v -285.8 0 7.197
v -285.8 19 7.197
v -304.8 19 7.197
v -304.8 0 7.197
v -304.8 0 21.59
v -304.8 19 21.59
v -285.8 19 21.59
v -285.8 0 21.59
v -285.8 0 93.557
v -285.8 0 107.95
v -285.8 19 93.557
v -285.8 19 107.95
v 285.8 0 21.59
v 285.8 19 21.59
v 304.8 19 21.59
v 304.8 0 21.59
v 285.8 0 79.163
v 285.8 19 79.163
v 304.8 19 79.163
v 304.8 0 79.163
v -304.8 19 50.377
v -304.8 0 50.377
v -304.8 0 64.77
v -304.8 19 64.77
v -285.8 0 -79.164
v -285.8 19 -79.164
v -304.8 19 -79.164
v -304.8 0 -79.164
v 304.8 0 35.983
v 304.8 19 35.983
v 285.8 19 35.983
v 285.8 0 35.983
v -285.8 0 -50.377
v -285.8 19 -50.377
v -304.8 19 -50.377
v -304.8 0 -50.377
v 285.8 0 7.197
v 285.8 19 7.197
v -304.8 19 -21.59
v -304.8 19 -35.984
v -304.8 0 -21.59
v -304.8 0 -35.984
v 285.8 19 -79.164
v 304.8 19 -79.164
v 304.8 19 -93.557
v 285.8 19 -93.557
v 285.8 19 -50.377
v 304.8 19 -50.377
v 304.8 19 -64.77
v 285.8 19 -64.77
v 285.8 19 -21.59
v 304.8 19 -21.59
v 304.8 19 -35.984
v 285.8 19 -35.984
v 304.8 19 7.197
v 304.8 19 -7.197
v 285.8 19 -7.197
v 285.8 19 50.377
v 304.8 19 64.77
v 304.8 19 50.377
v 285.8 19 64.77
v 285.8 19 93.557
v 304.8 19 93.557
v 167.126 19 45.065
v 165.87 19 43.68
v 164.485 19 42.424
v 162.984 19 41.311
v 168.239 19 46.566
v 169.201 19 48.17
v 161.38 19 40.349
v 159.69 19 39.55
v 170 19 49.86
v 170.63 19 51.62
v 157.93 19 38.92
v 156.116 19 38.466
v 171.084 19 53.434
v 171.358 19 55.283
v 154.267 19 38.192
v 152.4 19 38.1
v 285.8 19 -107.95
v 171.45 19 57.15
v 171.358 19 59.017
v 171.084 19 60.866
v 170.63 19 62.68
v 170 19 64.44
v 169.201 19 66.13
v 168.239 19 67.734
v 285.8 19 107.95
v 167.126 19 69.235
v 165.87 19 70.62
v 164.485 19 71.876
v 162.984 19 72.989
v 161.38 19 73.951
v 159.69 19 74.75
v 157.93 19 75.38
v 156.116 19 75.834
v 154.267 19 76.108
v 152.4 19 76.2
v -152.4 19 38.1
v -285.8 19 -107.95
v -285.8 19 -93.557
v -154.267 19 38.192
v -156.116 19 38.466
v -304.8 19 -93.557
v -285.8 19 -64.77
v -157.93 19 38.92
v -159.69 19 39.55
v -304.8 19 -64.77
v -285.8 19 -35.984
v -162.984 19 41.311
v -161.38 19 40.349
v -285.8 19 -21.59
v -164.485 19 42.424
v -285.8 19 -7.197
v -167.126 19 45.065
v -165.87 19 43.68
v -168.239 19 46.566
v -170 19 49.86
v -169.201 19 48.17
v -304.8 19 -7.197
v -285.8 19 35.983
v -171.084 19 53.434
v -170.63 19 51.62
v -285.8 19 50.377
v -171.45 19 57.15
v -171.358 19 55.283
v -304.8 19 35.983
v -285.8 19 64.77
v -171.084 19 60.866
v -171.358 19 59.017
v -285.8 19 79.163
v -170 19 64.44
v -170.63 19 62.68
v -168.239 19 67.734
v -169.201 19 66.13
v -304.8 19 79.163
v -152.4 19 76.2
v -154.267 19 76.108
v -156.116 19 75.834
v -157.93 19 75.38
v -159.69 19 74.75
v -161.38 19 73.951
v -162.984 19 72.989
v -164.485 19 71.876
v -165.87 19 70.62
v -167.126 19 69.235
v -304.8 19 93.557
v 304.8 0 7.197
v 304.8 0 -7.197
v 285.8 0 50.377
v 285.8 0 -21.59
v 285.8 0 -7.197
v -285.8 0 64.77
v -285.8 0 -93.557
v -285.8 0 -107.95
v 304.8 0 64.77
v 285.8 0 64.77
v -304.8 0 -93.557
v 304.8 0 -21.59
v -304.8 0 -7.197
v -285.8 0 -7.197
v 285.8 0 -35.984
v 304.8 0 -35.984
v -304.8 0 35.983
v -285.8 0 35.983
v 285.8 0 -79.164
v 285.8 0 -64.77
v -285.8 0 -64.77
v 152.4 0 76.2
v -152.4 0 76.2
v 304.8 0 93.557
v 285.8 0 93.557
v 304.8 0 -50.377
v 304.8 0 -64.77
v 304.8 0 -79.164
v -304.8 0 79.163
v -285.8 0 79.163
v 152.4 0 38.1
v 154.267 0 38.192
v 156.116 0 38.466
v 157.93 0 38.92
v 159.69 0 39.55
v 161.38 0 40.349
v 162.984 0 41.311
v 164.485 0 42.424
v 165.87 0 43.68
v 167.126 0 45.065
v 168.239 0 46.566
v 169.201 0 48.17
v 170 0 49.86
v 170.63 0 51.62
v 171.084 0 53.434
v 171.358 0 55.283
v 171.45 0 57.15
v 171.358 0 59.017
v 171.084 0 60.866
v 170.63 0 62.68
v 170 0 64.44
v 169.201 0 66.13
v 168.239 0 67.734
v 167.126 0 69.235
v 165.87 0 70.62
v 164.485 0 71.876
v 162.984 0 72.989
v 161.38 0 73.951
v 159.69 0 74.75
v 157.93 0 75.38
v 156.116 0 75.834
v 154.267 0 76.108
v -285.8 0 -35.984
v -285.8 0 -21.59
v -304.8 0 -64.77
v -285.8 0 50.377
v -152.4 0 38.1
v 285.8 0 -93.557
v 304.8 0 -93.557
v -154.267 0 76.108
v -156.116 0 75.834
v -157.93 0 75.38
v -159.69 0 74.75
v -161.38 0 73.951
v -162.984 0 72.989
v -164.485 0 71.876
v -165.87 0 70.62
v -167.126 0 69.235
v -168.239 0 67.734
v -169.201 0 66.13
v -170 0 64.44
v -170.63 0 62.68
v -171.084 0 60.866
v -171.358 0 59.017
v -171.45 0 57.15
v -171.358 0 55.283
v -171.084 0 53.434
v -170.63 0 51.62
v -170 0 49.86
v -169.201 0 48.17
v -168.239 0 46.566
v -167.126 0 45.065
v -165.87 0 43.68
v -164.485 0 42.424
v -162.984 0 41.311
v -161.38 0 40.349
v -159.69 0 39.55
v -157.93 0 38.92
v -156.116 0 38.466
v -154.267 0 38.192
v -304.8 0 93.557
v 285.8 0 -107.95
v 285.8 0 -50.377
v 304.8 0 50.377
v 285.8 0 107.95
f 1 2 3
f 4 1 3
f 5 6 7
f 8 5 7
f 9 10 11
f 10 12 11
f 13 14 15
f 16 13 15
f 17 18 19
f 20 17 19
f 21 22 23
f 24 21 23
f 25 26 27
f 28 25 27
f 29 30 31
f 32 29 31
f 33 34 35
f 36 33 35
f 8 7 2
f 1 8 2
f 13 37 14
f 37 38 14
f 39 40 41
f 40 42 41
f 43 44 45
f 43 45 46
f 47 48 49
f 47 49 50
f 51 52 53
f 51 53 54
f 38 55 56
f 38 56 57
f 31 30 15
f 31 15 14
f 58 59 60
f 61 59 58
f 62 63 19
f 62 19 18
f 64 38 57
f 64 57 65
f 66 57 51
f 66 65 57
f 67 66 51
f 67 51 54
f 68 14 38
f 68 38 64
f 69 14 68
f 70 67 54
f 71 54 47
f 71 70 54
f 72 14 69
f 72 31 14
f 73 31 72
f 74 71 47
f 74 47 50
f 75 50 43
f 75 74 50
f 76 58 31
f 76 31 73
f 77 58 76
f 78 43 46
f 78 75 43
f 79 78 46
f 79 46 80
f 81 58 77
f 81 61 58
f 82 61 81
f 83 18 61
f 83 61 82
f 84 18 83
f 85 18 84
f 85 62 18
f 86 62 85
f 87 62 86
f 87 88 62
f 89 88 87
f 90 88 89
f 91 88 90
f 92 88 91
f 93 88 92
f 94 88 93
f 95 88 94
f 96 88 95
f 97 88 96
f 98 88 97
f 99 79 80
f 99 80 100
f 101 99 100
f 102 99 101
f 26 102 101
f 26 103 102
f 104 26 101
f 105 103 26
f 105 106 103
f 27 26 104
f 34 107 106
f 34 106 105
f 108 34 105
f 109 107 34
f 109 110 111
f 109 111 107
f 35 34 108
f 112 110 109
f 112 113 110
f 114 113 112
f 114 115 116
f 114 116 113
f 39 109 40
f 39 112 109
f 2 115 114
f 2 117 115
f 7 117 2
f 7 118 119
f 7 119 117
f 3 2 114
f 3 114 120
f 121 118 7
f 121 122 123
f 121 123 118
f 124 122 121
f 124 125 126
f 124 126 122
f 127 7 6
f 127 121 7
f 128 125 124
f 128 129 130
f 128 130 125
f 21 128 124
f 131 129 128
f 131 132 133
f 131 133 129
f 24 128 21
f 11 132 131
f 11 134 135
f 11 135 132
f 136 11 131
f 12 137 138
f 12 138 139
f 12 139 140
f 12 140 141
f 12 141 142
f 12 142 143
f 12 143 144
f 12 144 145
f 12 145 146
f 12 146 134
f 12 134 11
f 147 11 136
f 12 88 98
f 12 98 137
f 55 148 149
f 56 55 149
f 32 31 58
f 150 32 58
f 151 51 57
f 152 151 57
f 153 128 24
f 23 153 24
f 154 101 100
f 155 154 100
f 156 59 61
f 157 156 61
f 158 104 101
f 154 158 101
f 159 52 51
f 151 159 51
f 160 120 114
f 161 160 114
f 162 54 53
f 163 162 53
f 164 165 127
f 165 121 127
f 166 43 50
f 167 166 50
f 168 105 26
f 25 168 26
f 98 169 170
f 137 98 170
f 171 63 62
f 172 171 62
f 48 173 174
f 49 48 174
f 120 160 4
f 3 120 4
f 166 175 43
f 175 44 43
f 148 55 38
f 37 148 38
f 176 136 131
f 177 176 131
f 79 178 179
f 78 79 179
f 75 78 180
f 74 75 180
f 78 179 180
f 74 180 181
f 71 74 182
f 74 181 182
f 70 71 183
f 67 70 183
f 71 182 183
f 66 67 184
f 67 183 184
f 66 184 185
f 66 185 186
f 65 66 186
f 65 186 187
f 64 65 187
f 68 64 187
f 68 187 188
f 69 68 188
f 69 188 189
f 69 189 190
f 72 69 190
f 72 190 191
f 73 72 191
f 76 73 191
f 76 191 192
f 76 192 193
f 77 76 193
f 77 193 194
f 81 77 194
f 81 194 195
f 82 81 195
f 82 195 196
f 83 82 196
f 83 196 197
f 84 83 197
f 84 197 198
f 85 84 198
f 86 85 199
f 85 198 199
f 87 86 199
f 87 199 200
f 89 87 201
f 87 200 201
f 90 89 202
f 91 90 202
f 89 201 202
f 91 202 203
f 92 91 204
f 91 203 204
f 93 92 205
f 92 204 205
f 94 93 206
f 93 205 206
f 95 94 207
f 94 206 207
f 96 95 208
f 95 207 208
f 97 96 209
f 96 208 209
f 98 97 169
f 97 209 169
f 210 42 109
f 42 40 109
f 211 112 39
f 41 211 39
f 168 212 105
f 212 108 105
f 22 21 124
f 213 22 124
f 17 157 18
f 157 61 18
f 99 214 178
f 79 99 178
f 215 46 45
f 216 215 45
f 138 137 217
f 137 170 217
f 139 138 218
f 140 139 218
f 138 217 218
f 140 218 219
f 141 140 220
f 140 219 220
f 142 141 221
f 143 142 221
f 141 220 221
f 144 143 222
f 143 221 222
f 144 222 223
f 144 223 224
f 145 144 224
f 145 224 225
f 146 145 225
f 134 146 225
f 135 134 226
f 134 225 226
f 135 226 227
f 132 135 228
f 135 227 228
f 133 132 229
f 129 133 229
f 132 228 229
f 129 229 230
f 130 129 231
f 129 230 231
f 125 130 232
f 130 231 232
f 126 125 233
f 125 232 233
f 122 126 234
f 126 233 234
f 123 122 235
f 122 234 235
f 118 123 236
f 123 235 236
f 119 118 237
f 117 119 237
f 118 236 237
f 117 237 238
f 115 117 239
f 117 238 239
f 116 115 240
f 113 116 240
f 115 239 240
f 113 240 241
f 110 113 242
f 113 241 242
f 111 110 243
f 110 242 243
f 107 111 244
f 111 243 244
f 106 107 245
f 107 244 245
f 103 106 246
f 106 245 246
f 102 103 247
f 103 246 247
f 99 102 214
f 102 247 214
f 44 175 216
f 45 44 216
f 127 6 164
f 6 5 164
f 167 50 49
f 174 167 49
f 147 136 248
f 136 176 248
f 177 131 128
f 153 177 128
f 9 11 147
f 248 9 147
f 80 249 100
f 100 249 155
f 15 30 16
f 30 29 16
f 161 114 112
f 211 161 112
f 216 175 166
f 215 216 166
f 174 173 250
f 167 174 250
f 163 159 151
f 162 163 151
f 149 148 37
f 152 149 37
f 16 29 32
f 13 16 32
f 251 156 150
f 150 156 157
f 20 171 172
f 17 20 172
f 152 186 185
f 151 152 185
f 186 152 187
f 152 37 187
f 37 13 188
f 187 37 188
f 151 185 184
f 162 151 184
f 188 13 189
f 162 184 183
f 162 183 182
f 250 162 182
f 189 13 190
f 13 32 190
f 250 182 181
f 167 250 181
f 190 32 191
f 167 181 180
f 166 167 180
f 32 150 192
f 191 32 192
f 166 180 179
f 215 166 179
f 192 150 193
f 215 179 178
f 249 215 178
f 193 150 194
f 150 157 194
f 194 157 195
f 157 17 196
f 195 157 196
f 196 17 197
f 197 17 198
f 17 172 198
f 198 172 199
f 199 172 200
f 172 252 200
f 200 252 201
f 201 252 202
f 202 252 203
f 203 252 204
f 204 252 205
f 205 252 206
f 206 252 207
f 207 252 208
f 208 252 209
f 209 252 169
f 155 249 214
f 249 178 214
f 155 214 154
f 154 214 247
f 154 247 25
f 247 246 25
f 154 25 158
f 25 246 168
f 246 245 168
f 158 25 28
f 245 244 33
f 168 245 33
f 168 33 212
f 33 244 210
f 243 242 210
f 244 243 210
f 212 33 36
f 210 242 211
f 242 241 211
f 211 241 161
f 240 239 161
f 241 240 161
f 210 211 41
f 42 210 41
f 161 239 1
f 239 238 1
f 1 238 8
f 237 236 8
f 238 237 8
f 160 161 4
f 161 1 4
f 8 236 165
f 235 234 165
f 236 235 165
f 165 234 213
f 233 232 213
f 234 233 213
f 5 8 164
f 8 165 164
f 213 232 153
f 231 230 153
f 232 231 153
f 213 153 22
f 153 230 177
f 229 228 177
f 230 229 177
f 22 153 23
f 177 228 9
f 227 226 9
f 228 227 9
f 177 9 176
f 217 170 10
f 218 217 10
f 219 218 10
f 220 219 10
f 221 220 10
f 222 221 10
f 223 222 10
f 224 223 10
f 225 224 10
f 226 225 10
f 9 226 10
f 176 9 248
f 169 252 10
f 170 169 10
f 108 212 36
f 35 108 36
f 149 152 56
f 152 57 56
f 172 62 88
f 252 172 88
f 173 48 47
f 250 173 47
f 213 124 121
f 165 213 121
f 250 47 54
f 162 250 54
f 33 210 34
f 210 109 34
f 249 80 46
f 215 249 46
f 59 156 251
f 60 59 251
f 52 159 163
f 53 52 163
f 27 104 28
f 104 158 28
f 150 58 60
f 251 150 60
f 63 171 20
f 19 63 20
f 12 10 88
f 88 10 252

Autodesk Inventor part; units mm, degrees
ref_plane "YZ Plane" through (0, 0, 0) normal (1, 0, 0) x (0, 1, 0)
ref_plane "XZ Plane" through (0, 0, 0) normal (0, 1, 0) x (-1, 0, 0)
ref_plane "XY Plane" through (0, 0, 0) normal (0, 0, 1) x (1, 0, 0)
sketch "Sketch1" plane through (0, 0, 0) normal (0, 1, 0) x (-1, 0, 0)
  line L0 (304.8, 107.95) -> (-304.8, 107.95)
  line L1 (-304.8, 107.95) -> (-304.8, -107.95)
  line L2 (-304.8, -107.95) -> (304.8, -107.95)
  line L3 (304.8, -107.95) -> (304.8, 107.95)
  line L4 (304.8, 107.95) -> (-304.8, -107.95) construction
  line L5 (-304.8, 107.95) -> (304.8, -107.95) construction
  point P0 (0, 0)
  dimension "length" = 609.6
  dimension "width" = 215.9
extrude "Extrusion1" add sketch "Sketch1" along normal blind 19
sketch "Sketch3" plane through (0, 19, 0) normal (0, 1, 0) x (1, 0, 0)
  line L0 (-304.8, 107.95) -> (-304.8, -107.95) projected
  line L1 (-304.8, -107.95) -> (304.8, -107.95) projected
  line L2 (-304.8, -107.95) -> (-285.8, -107.95)
  line L3 (-285.8, -107.95) -> (-285.8, -93.5567)
  line L4 (-285.8, -93.5567) -> (-304.8, -93.5567)
  line L5 (-304.8, -93.5567) -> (-304.8, -107.95)
  point P0 (0, 0)
  dimension "d21" = 19
  dimension "d22" = 14.3933
extrude "Extrusion3" cut sketch "Sketch3" against normal through all
mirror "Mirror2" about plane through (0, 0, 0) normal (0, 0, 1) of "Extrusion3"
sketch "Sketch4" plane through (0, 19, 0) normal (0, 1, 0) x (1, 0, 0)
  line L0 (-304.8, 93.5567) -> (-304.8, -93.5567) projected
  line L1 (-304.8, -79.1633) -> (-285.8, -79.1633)
  line L2 (-285.8, -79.1633) -> (-285.8, -64.77)
  line L3 (-285.8, -64.77) -> (-304.8, -64.77)
  line L4 (-304.8, -64.77) -> (-304.8, -79.1633)
  line L5 (-304.8, -93.5567) -> (-285.8, -93.5567) projected
  point P0 (0, 0)
  dimension "d25" = 19
  dimension "d26" = 14.3933
  dimension "d27" = 14.3933
extrude "Extrusion4" cut sketch "Sketch4" against normal through all
pattern_linear "Rectangular Pattern1" count 6 spacing 28.7867 along (0, 0, -1) of "Extrusion4"
mirror "Mirror3" about plane through (0, 0, 0) normal (1, 0, 0) of "Extrusion3", "Mirror2", "Extrusion4", "Rectangular Pattern1"
sketch "Sketch5" plane through (0, 0, 0) normal (0, -1, 0) x (1, 0, 0)
  line L0 (152.4, 57.15) -> (-152.4, 57.15) construction
  line L1 (152.4, 76.2) -> (-152.4, 76.2)
  line L2 (-152.4, 38.1) -> (152.4, 38.1)
  arc A0 (152.4, 38.1) -> (152.4, 76.2) centre (152.4, 57.15) ccw
  arc A1 (-152.4, 76.2) -> (-152.4, 38.1) centre (-152.4, 57.15) ccw
  line L3 (-285.8, 107.95) -> (285.8, 107.95) projected
  point P0 (0, 0)
  point P1 (0, 57.15)
  dimension "d33" = 38.1
  dimension "d34" = 304.8
  dimension "d35" = 0
  dimension "d36" = 50.8
extrude "Extrusion5" cut sketch "Sketch5" against normal blind 19
equation "\"d21\" = thickness"
equation "\"d25\" = thickness"
equation "\"d37\" = thickness"
equation "\"thickness\" = 19"
properties part number "cabinet-bottom" material "Wood (Birch)"
